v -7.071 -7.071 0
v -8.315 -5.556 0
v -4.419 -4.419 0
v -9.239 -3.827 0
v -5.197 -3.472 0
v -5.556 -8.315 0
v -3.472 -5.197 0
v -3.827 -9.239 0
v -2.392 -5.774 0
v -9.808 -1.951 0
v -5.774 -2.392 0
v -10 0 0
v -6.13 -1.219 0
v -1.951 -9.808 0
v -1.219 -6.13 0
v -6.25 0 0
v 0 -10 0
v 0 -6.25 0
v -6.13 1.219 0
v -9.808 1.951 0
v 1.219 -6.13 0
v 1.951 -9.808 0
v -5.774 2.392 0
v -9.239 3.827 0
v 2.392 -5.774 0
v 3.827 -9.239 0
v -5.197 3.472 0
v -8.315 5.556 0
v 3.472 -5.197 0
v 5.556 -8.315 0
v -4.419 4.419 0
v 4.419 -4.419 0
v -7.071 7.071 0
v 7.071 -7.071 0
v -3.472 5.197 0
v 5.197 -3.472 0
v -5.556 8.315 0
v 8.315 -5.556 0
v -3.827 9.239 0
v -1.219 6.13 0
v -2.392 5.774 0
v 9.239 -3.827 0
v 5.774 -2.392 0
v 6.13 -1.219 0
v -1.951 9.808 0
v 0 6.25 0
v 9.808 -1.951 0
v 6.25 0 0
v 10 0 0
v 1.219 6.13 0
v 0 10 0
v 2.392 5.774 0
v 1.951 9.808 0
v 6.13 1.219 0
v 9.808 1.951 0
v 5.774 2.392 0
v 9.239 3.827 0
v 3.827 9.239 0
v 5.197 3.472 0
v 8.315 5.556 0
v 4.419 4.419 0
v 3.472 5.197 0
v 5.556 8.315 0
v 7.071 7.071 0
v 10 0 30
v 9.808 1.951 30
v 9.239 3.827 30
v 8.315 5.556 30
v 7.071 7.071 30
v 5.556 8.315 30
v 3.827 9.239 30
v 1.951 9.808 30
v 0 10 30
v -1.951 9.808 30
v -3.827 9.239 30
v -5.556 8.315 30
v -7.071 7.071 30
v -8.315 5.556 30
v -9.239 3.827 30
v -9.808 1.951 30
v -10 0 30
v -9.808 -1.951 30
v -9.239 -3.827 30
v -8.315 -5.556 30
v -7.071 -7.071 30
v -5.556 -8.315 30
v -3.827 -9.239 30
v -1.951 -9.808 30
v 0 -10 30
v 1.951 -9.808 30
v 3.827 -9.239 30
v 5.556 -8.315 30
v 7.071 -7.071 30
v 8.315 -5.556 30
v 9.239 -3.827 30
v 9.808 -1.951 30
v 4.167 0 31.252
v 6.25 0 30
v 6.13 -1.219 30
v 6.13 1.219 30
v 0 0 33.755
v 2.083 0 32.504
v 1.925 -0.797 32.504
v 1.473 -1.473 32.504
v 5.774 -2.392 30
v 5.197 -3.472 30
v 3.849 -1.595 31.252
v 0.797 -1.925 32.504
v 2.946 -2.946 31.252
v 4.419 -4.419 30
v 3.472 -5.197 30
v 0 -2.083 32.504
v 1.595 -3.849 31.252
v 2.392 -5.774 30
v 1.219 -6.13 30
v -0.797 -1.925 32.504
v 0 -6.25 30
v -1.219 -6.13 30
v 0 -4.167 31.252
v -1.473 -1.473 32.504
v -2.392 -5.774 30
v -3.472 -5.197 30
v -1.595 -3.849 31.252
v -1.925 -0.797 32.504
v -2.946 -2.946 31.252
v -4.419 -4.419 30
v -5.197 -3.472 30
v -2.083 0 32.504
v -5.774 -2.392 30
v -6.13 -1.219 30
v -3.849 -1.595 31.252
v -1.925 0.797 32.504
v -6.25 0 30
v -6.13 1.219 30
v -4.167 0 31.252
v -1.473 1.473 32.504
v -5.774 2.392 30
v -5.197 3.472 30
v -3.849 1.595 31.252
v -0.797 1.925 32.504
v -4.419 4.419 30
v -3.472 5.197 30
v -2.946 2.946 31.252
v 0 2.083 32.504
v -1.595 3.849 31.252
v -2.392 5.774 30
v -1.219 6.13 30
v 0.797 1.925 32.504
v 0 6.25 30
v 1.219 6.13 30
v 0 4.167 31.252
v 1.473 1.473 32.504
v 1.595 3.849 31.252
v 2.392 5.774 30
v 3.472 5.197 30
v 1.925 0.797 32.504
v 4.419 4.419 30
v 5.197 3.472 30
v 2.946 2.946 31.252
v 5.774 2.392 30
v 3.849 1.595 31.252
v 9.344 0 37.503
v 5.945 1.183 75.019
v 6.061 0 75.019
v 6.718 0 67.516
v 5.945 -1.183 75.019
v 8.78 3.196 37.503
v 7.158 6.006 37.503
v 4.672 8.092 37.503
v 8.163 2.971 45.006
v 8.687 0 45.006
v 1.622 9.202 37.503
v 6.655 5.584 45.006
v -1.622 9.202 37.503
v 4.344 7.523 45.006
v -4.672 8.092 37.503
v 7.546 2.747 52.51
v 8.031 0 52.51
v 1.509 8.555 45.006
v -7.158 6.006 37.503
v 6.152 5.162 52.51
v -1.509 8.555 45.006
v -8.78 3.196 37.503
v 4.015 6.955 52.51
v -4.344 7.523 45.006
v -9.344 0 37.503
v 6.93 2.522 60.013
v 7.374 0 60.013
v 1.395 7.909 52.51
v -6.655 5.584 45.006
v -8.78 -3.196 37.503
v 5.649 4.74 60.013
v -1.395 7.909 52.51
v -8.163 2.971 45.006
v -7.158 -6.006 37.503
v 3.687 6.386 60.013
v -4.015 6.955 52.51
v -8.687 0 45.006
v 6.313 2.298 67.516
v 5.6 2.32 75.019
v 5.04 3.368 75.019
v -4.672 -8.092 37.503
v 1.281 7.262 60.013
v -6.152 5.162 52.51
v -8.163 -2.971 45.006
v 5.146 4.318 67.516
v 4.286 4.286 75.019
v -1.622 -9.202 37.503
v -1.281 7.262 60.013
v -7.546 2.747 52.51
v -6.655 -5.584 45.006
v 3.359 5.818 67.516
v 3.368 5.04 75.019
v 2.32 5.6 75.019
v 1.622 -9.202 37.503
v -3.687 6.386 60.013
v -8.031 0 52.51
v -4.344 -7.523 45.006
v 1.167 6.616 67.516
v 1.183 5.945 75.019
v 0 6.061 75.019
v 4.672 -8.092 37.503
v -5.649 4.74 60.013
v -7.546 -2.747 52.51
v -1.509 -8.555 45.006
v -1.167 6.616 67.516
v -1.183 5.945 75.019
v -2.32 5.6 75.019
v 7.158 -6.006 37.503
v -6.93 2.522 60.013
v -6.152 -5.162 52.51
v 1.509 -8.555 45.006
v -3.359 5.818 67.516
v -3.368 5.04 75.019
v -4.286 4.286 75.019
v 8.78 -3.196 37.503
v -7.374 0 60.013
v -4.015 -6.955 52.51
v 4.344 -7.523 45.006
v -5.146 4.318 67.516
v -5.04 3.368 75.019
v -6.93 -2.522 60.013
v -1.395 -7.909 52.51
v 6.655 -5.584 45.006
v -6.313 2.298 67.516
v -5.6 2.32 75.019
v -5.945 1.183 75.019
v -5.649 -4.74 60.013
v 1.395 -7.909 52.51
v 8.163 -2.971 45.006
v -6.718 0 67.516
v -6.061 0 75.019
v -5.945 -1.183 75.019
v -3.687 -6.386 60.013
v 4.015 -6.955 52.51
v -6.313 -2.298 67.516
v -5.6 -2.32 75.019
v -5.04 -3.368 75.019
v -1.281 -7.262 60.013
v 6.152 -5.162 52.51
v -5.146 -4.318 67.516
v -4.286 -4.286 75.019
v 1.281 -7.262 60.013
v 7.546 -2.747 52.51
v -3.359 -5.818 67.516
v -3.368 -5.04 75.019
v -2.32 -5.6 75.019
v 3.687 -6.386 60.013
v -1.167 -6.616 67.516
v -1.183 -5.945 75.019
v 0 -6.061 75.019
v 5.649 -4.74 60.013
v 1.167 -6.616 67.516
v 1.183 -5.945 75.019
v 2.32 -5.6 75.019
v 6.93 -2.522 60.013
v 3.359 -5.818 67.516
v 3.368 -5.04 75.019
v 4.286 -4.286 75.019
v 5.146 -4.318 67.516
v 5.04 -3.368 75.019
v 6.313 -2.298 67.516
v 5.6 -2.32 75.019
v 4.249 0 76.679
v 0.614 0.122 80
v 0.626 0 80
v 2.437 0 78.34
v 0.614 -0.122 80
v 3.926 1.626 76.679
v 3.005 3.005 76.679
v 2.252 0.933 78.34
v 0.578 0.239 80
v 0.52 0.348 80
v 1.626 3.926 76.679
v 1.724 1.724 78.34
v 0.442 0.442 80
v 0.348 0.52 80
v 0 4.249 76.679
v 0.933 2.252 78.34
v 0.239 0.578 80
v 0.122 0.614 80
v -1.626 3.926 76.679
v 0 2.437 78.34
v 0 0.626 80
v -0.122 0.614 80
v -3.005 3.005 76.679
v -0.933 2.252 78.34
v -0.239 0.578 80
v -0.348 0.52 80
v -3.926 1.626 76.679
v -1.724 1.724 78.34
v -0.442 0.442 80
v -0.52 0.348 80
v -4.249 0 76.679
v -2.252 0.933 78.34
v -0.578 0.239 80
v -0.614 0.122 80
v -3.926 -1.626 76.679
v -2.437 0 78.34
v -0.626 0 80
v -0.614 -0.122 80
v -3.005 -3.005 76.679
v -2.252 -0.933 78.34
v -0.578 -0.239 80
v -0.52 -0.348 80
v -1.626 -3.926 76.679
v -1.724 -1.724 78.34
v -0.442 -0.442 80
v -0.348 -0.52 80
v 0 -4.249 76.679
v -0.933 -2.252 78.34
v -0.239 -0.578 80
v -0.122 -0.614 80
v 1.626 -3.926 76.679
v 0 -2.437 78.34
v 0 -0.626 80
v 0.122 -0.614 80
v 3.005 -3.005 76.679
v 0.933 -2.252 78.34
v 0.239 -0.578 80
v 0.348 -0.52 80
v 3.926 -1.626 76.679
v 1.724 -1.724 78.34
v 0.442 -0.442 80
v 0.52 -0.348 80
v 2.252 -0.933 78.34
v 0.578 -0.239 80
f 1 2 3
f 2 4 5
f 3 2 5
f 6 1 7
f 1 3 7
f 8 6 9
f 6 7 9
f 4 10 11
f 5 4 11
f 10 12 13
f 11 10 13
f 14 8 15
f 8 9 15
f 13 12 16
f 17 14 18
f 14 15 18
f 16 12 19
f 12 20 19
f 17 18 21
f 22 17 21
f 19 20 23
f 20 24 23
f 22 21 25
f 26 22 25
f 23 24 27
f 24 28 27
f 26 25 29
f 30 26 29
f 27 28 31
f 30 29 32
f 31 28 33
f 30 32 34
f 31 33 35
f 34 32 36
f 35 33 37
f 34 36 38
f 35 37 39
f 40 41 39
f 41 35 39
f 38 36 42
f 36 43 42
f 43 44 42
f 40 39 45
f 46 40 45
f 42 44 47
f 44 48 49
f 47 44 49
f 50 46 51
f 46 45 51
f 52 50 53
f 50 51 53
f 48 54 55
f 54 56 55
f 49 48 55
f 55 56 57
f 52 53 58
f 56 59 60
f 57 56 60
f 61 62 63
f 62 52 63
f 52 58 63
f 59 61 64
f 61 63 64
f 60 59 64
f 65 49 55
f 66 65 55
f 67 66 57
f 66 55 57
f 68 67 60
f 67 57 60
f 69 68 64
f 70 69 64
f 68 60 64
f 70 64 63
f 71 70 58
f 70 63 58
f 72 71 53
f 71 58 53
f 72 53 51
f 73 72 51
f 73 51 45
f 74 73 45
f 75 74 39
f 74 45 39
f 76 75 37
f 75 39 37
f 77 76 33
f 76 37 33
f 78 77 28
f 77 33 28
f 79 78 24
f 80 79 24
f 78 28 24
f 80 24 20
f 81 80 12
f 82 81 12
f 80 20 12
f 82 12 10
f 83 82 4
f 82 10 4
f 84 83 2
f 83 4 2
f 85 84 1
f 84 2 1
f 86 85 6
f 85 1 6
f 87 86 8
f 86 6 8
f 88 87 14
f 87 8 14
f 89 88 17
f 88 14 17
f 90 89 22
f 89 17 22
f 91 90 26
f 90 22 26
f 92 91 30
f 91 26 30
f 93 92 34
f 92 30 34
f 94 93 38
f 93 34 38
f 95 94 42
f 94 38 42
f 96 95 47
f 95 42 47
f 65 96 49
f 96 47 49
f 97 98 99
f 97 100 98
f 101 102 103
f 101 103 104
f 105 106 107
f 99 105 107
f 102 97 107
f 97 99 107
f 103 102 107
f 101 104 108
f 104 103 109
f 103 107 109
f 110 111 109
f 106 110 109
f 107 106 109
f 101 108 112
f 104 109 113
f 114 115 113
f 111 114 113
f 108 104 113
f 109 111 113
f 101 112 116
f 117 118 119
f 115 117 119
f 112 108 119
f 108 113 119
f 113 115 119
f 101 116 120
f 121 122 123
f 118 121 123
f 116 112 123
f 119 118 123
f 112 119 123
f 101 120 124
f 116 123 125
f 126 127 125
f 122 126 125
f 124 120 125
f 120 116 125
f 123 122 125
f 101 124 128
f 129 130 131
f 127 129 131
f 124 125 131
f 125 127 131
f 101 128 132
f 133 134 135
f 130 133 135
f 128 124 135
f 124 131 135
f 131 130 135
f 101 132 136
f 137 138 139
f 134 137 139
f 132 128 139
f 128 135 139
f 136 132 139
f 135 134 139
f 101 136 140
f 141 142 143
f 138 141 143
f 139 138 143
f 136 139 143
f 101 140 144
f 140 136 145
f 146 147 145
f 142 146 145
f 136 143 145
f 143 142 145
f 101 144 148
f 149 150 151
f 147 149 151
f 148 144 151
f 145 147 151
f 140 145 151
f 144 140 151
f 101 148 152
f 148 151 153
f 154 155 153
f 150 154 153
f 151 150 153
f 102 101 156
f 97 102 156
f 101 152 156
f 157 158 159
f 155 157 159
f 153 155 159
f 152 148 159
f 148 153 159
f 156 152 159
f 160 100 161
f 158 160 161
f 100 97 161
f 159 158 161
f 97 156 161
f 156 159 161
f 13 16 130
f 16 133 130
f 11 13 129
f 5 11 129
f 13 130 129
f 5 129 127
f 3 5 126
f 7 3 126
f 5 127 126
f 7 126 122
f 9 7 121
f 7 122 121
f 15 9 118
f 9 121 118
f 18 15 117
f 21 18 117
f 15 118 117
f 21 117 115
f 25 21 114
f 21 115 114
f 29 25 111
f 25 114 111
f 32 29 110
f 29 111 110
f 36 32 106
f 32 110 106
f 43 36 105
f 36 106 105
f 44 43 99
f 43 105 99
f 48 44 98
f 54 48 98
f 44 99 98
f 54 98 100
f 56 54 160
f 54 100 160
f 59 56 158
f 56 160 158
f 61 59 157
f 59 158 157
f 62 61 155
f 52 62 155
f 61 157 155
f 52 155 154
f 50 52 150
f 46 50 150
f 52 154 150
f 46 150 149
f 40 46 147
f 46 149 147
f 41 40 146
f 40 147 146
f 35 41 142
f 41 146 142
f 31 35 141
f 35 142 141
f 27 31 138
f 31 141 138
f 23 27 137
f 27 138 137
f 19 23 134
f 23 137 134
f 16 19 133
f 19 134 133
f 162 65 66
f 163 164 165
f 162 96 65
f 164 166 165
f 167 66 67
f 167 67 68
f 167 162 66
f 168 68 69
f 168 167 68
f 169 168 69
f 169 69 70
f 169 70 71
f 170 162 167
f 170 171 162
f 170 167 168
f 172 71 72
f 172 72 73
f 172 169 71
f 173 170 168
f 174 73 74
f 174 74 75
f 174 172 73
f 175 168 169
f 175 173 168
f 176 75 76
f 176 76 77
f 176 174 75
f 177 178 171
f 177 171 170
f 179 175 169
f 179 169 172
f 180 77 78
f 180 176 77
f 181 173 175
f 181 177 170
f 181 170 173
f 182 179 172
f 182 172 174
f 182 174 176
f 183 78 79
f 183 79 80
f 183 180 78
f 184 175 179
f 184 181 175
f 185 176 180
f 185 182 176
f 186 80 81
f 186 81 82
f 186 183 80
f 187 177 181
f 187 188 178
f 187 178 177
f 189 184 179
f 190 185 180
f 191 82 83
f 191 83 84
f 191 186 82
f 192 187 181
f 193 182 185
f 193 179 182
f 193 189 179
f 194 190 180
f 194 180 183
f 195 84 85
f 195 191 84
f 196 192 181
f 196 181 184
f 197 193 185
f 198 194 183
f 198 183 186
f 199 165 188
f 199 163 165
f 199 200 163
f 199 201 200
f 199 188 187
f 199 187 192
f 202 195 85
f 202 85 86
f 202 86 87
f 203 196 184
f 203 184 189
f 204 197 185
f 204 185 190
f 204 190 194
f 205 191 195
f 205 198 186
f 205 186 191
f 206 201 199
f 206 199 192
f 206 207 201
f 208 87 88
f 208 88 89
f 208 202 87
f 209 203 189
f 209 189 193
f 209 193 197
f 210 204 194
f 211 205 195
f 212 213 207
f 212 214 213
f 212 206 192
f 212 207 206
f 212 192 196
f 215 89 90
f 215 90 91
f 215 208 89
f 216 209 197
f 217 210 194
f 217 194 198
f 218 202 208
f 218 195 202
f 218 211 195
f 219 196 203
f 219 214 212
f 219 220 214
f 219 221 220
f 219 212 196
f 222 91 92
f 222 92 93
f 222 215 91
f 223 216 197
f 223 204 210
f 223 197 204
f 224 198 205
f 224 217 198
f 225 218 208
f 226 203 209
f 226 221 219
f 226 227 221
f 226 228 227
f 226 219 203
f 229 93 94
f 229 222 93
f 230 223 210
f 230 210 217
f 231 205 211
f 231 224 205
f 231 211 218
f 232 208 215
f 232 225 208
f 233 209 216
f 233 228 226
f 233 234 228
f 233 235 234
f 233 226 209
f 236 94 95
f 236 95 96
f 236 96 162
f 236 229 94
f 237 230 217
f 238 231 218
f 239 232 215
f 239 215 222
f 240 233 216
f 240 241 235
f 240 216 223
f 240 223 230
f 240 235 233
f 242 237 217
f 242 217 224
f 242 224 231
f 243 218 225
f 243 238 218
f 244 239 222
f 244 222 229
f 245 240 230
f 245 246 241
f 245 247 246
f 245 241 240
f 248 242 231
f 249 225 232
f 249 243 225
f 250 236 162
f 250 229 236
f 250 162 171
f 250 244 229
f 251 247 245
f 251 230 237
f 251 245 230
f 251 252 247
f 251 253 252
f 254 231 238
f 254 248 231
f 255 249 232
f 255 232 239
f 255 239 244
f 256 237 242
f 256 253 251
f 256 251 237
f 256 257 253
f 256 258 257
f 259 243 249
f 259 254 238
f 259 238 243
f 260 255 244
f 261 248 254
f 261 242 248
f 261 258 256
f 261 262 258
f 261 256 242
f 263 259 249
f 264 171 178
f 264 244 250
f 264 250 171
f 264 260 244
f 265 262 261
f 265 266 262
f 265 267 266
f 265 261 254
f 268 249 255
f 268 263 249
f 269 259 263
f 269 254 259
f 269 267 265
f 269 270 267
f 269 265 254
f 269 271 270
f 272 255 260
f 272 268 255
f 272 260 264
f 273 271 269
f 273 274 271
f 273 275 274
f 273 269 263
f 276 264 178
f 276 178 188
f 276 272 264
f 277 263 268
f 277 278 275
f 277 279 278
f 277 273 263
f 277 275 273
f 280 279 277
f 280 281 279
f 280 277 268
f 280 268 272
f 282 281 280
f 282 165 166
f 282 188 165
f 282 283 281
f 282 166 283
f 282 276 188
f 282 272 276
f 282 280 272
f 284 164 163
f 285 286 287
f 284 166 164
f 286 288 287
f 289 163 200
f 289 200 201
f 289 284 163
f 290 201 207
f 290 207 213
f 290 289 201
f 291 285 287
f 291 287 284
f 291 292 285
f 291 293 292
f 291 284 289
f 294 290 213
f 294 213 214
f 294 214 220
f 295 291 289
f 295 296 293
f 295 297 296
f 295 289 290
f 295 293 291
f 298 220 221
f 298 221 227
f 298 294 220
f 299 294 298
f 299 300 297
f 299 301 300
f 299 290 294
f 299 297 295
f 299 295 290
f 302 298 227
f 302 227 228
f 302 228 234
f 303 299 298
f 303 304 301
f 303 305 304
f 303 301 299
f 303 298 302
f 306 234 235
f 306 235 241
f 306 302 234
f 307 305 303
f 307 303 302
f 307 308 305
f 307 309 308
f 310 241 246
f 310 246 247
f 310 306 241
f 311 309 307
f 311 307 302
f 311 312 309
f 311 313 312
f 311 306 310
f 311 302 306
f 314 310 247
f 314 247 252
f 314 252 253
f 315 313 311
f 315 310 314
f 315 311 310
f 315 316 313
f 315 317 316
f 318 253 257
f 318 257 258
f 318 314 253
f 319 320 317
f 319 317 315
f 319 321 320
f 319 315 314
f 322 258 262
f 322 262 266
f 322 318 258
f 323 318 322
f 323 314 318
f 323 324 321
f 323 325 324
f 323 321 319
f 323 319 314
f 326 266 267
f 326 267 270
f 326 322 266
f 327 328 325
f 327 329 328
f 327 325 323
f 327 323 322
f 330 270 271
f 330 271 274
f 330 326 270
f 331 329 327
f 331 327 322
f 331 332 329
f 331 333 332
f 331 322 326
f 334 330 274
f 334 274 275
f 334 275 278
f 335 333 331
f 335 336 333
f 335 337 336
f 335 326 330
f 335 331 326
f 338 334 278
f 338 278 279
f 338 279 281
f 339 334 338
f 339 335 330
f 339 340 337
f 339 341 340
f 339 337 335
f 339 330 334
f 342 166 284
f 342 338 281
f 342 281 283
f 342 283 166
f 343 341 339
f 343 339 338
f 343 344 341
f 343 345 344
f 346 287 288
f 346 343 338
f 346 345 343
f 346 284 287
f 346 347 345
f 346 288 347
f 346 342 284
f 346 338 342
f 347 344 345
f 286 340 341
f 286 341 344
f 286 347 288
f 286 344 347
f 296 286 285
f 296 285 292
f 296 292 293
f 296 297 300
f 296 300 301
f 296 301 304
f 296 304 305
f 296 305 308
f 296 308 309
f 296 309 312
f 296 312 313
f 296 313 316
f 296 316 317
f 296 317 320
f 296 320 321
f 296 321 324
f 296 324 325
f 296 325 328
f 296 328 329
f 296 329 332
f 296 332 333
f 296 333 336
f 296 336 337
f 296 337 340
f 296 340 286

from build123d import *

# Parameters (mm, degrees)
F0_R     = 10
F1_DEPTH = 80
F2_SIZE2 = 4.3744331763
F2_SIZE  = 50
F3_SIZE  = 5
F5_D     = 12.5
F5_DEPTH = 30
F5_TIP   = 3.7553788689


with BuildPart() as f1:
    # F0 (on Top) → F1 (new body)
    with BuildSketch(Plane.XY):
        Circle(F0_R)
    extrude(amount=F1_DEPTH)

    # F2
    f2_edges = [f1.edges().sort_by_distance(p)[0] for p in [
        (-10, 0, 80),
    ]]
    f2_side = f1.faces().sort_by_distance((-10, 0, 40))[0]
    chamfer(f2_edges, length=F2_SIZE, length2=F2_SIZE2, reference=f2_side)

    # F3
    f3_edges = [f1.edges().sort_by_distance(p)[0] for p in [
        (-5.625567, 0, 80),
    ]]
    chamfer(f3_edges, length=F3_SIZE)

    # F5
    with Locations(Plane(origin=(0, 0, 0), x_dir=(1, 0, 0), z_dir=(0, 0, -1))):
        with Locations((0, 0)):
            Hole(F5_D / 2, depth=F5_DEPTH)
            with Locations((0, 0, -(F5_DEPTH + F5_TIP / 2))):  # 118° drill point
                Cone(0, F5_D / 2, F5_TIP, mode=Mode.SUBTRACT)


solid = f1.part
